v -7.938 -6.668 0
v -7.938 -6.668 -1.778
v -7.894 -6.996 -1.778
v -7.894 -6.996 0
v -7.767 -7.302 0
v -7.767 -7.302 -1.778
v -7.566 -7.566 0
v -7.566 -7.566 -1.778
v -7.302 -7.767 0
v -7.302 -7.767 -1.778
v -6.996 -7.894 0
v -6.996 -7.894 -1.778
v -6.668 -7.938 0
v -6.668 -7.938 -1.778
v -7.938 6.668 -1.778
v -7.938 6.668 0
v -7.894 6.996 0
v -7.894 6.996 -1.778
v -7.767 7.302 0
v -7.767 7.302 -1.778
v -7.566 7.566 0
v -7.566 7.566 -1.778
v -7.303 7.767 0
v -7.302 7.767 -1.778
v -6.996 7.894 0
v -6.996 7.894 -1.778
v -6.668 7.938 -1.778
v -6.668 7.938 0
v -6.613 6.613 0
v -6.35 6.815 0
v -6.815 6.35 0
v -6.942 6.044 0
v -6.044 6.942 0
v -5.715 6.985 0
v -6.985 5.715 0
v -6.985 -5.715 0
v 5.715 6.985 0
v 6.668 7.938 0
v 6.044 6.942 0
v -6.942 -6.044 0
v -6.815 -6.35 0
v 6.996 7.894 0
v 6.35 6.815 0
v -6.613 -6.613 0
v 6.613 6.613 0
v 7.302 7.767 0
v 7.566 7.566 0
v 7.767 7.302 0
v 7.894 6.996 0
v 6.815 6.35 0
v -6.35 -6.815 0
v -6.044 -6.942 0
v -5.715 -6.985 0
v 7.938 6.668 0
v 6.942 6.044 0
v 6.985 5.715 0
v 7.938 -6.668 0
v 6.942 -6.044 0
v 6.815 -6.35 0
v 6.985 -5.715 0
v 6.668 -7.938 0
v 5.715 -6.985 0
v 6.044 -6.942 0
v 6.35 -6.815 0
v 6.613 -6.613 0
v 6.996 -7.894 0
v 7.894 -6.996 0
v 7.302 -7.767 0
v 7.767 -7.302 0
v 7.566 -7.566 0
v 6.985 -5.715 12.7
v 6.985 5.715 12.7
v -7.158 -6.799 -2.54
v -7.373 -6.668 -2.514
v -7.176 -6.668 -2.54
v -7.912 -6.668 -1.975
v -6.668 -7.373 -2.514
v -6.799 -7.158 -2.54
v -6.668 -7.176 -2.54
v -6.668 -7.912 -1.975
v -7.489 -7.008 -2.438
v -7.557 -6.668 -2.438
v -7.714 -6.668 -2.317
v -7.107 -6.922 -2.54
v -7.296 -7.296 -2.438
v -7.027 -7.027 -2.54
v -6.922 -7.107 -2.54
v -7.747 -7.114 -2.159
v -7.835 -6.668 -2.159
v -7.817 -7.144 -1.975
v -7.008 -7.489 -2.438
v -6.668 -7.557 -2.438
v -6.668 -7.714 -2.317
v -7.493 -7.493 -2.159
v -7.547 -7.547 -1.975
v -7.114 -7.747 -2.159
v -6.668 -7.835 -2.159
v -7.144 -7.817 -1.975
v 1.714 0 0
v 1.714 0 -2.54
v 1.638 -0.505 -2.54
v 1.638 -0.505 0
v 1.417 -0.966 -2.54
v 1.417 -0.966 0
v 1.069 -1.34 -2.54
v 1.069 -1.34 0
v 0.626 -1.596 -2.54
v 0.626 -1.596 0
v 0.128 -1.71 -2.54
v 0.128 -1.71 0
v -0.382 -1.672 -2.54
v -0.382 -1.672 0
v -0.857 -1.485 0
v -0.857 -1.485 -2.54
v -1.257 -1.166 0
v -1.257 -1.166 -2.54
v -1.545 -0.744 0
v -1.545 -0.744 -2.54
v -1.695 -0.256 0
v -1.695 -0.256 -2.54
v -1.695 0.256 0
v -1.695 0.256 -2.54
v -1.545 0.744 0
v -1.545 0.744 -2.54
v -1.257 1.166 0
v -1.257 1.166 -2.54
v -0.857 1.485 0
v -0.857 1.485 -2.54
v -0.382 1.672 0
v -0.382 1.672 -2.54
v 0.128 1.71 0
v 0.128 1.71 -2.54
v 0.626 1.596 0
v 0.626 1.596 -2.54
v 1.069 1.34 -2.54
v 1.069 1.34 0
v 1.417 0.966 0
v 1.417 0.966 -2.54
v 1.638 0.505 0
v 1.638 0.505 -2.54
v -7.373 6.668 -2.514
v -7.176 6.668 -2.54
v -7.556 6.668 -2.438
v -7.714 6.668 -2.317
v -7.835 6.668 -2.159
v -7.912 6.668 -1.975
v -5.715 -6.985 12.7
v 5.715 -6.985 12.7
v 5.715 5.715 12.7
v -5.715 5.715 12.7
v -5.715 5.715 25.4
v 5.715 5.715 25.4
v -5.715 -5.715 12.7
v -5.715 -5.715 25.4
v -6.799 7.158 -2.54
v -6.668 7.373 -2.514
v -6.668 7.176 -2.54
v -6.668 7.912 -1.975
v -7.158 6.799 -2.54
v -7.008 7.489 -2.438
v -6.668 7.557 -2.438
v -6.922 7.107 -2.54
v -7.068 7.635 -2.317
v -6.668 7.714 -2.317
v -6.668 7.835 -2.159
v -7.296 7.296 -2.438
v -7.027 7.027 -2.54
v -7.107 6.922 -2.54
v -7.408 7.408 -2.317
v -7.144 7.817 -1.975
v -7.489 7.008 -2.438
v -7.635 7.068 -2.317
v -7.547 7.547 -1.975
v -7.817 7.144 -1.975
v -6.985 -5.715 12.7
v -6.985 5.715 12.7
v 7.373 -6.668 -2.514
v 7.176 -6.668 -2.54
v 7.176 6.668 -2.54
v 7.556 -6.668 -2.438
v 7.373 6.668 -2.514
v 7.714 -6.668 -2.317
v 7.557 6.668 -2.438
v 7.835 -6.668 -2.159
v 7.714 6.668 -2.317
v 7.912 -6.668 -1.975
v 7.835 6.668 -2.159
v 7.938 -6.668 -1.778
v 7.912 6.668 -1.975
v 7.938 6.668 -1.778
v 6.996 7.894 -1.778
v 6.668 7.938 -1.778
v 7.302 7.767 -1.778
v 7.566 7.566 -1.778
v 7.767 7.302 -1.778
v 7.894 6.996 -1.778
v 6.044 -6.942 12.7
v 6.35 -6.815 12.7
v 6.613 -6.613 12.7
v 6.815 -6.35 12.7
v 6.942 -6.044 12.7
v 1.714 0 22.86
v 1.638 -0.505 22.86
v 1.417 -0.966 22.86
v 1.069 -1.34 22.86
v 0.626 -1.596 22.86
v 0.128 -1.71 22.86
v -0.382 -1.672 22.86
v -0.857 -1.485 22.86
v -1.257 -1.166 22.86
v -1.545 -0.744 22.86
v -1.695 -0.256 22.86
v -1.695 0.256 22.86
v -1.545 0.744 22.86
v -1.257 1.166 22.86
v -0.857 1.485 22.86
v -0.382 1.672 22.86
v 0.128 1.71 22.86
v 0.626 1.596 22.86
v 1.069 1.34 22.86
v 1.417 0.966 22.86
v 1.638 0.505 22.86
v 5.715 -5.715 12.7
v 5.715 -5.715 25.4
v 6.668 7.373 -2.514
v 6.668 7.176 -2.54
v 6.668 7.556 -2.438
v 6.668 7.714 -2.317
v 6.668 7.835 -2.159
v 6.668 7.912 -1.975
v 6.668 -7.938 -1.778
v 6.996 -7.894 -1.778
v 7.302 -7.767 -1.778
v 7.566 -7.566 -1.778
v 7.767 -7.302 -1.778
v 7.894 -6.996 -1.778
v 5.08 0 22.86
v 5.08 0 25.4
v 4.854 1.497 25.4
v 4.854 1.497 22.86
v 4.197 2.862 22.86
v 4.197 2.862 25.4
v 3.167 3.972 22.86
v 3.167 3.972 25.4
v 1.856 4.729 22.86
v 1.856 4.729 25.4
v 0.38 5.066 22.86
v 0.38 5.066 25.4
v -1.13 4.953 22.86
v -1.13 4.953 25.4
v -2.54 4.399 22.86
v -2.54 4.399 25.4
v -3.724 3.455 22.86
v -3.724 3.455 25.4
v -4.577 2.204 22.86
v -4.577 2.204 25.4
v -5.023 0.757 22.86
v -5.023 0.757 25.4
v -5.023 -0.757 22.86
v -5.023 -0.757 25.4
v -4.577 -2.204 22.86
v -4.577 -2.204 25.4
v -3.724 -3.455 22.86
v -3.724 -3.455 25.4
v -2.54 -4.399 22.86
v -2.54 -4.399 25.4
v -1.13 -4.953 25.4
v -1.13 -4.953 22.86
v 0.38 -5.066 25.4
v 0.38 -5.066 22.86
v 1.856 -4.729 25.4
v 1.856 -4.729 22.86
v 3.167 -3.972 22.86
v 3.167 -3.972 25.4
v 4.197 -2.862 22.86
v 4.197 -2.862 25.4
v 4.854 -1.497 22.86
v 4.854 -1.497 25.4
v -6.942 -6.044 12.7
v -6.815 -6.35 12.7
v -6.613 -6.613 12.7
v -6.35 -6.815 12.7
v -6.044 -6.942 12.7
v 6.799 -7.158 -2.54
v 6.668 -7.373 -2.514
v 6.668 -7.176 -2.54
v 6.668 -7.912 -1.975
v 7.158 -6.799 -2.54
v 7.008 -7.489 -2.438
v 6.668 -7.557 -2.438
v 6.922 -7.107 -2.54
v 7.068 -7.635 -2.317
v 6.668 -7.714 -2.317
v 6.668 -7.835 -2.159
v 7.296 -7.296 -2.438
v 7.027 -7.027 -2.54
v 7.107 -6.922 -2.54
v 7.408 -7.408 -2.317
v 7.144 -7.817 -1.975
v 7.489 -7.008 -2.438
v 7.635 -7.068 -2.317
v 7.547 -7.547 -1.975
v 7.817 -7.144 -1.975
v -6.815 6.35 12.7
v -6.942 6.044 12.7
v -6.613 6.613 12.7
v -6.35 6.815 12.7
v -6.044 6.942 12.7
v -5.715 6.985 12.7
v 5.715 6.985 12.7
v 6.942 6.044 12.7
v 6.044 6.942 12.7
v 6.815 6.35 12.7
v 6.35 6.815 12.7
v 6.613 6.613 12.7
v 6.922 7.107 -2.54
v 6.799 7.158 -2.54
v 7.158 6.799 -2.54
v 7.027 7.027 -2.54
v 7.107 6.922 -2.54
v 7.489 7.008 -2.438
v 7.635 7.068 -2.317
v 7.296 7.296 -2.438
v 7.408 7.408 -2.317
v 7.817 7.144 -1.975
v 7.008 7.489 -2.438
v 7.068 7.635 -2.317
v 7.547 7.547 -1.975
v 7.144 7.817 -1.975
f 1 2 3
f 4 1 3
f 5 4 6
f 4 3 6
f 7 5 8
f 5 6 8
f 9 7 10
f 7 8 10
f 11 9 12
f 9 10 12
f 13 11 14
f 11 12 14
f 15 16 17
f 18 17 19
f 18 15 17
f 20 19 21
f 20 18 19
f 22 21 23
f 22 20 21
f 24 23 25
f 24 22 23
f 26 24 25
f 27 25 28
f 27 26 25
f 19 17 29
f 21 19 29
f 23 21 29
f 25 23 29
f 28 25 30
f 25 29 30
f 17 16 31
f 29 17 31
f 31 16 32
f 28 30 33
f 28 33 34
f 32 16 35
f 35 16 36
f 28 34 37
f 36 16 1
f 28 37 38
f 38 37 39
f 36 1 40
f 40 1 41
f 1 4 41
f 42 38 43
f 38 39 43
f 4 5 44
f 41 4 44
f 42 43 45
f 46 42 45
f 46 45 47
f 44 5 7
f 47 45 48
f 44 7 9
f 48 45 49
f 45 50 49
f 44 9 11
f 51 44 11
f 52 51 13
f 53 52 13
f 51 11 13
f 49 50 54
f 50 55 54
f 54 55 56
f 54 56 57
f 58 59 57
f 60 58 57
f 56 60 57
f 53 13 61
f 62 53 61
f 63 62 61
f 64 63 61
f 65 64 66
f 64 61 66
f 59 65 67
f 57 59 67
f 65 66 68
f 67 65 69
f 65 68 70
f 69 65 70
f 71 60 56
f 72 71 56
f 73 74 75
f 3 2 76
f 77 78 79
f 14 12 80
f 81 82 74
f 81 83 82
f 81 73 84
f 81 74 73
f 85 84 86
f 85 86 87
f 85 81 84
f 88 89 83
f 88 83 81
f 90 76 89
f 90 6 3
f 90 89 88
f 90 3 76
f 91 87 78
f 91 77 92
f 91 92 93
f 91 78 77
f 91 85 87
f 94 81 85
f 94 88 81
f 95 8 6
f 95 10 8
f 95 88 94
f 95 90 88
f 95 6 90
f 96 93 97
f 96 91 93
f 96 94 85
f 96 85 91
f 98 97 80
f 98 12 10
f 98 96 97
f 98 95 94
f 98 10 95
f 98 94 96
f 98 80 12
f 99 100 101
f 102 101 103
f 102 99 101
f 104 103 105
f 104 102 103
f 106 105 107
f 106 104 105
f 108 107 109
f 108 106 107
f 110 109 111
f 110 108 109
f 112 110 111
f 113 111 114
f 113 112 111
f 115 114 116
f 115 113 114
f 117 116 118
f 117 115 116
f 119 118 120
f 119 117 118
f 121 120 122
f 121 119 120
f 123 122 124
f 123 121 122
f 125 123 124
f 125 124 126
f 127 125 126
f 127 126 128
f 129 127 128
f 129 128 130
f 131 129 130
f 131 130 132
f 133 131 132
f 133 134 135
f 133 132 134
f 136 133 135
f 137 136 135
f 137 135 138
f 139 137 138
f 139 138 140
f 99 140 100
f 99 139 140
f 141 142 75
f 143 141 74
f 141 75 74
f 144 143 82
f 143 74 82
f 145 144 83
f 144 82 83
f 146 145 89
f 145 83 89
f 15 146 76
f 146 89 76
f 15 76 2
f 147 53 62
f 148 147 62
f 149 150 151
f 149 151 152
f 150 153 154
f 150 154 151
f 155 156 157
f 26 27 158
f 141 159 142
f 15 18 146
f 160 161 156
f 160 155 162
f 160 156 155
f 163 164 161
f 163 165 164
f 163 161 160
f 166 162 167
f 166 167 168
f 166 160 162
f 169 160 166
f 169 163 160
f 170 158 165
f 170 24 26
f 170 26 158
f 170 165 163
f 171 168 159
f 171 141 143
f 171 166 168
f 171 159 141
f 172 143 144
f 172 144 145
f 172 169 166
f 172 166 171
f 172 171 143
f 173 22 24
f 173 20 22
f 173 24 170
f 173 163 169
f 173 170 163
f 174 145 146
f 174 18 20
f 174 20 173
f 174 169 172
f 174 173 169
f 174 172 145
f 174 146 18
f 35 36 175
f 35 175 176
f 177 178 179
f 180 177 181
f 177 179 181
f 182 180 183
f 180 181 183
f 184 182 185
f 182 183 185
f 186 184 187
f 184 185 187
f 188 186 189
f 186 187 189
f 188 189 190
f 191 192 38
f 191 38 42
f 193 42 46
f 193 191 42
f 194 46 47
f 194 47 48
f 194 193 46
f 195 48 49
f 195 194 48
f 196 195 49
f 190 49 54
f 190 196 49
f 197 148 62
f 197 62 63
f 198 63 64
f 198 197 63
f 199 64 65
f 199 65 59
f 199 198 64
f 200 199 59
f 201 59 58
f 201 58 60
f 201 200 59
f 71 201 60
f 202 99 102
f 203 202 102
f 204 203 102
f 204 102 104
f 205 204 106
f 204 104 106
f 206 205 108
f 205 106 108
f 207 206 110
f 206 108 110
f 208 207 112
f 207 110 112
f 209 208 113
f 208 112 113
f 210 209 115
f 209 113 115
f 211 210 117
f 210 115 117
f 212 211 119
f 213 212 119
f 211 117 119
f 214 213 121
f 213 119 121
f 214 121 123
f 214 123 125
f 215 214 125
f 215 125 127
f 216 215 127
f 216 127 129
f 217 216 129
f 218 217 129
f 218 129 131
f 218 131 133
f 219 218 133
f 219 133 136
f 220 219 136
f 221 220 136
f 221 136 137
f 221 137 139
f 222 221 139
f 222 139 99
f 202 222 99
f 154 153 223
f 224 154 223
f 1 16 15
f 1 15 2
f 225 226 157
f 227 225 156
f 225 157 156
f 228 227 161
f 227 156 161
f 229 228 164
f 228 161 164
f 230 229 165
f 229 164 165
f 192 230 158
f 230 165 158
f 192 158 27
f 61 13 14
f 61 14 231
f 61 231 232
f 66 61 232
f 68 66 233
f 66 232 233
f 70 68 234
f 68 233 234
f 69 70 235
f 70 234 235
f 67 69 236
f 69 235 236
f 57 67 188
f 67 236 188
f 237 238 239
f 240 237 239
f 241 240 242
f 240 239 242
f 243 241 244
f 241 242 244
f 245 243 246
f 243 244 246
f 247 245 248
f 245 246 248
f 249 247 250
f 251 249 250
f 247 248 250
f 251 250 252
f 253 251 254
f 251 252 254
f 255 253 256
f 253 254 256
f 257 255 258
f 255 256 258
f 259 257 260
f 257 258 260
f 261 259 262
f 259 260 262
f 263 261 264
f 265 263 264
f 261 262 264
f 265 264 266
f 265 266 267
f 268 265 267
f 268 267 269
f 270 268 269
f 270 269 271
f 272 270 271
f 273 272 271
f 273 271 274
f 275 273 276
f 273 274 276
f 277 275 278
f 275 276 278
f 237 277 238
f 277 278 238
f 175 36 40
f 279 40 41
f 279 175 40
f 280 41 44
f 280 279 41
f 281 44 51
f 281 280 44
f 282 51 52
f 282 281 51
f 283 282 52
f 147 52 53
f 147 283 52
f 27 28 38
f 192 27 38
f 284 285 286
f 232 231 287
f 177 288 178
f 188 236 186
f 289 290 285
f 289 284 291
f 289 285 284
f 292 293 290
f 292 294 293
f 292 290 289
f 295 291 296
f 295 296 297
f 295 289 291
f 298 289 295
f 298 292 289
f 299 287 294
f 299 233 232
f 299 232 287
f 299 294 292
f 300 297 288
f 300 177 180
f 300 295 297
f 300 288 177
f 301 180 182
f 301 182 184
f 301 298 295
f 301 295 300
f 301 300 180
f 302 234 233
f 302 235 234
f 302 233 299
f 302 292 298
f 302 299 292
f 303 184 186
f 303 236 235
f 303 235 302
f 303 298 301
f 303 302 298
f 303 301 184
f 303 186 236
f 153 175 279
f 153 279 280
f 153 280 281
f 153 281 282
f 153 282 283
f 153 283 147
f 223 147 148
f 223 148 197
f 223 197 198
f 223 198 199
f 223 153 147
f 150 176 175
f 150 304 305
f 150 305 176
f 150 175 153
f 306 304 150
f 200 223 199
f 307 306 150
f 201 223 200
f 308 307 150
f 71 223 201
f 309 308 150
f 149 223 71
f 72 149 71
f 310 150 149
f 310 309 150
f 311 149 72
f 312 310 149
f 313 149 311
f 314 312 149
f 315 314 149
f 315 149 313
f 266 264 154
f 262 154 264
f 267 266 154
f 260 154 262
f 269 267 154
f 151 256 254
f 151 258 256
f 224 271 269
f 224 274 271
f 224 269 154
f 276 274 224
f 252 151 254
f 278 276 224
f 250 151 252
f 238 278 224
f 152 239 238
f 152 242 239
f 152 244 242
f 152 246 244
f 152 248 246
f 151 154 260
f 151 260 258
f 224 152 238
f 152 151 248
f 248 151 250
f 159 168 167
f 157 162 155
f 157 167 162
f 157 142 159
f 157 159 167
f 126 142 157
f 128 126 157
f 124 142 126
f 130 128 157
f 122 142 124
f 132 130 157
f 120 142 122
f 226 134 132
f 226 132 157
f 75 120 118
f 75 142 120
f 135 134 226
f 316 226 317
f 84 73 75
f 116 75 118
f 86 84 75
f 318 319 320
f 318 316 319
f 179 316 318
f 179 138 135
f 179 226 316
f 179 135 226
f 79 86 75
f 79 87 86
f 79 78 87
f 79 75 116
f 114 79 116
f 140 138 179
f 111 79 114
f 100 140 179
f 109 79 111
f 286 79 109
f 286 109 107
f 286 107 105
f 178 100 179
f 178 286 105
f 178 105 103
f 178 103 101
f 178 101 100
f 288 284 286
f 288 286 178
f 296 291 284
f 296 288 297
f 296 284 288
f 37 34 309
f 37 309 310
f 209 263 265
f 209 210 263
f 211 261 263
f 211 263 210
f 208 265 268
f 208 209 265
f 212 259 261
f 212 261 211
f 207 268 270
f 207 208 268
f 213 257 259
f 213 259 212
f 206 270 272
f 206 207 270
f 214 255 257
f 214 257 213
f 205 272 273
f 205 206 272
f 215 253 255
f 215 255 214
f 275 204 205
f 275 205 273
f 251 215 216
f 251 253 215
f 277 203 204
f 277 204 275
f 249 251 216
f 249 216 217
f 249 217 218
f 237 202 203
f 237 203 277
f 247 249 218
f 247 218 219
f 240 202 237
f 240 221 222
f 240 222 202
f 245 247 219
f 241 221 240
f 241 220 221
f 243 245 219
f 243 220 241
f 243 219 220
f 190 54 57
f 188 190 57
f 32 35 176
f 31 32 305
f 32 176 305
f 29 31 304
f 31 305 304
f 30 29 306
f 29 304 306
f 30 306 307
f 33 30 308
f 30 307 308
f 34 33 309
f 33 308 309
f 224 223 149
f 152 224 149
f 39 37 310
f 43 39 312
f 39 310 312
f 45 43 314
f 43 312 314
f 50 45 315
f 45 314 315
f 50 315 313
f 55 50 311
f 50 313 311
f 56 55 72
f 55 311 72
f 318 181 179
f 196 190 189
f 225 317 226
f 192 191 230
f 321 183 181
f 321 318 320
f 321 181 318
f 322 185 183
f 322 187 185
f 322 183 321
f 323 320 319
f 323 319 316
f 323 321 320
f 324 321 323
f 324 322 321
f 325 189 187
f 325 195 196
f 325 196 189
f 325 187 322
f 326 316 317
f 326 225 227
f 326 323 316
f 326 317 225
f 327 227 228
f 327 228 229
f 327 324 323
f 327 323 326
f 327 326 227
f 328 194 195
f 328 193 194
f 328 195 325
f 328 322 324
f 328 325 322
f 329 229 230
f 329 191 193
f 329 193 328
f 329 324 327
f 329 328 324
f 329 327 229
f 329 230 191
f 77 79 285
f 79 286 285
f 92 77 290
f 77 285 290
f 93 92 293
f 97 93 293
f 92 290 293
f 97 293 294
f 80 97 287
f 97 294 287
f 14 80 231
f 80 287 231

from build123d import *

# Parameters (mm, degrees)
F0_W           = 13.97
F0_H           = 13.97
F1_DEPTH       = 25.4
F2_R           = 5.08
F3_DEPTH       = 2.54
F5_R           = 1.27
F6_W           = 15.875
F6_H           = 15.875
F7_DEPTH       = 2.54
F8_R           = 1.27
F9_R           = 0.762
F4_R           = 1.7145
F10_DEPTH      = 25.401
F10_DEPTH_BACK = 2.541
F11_W          = 17.78
F11_H          = 17.78
F11_W_2        = 11.43
F11_H_2        = 11.43
F12_DEPTH      = 12.7


with BuildPart() as f1:
    # F0 (on Top) → F1 (new body)
    with BuildSketch(Plane.XY):
        Rectangle(F0_W, F0_H)
    extrude(amount=F1_DEPTH)

    # F2 (on face) → F3 (cut)
    with BuildSketch(Plane.XY.offset(25.4)):
        Circle(F2_R)
    extrude(amount=-F3_DEPTH, mode=Mode.SUBTRACT)

    # F5
    f5_edges = [f1.edges().sort_by_distance(p)[0] for p in [
        (-6.985, 6.985, 12.7),
        (-6.985, -6.985, 12.7),
        (6.985, 6.985, 12.7),
        (6.985, -6.985, 12.7),
    ]]
    fillet(f5_edges, radius=F5_R)

    # F6 (on face) → F7 (join)
    with BuildSketch(Plane(origin=(0, 0, 0), x_dir=(1, 0, 0), z_dir=(0, 0, -1))):
        Rectangle(F6_W, F6_H)
    extrude(amount=F7_DEPTH)

    # F8
    f8_edges = [f1.edges().sort_by_distance(p)[0] for p in [
        (7.9375, -7.9375, -1.27),
        (-7.9375, -7.9375, -1.27),
        (-7.9375, 7.9375, -1.27),
        (7.9375, 7.9375, -1.27),
    ]]
    fillet(f8_edges, radius=F8_R)

    # F9
    f9_edges = [f1.edges().sort_by_distance(p)[0] for p in [
        (0, -7.9375, -2.54),
    ]]
    fillet(f9_edges, radius=F9_R)

    # F4 (on face) → F10 (cut, two sides)
    with BuildSketch(Plane(origin=(0, 0, 0), x_dir=(1, 0, 0), z_dir=(0, 0, -1))) as f10_sk:
        Circle(F4_R)
    extrude(amount=-F10_DEPTH, mode=Mode.SUBTRACT)
    extrude(f10_sk.sketch, amount=F10_DEPTH_BACK, mode=Mode.SUBTRACT)

    # F11 (on face) → F12 (cut)
    with BuildSketch(Plane.XY.offset(25.4)):
        Rectangle(F11_W, F11_H)
        Rectangle(F11_W_2, F11_H_2, mode=Mode.SUBTRACT)
    extrude(amount=-F12_DEPTH, mode=Mode.SUBTRACT)


solid = f1.part
